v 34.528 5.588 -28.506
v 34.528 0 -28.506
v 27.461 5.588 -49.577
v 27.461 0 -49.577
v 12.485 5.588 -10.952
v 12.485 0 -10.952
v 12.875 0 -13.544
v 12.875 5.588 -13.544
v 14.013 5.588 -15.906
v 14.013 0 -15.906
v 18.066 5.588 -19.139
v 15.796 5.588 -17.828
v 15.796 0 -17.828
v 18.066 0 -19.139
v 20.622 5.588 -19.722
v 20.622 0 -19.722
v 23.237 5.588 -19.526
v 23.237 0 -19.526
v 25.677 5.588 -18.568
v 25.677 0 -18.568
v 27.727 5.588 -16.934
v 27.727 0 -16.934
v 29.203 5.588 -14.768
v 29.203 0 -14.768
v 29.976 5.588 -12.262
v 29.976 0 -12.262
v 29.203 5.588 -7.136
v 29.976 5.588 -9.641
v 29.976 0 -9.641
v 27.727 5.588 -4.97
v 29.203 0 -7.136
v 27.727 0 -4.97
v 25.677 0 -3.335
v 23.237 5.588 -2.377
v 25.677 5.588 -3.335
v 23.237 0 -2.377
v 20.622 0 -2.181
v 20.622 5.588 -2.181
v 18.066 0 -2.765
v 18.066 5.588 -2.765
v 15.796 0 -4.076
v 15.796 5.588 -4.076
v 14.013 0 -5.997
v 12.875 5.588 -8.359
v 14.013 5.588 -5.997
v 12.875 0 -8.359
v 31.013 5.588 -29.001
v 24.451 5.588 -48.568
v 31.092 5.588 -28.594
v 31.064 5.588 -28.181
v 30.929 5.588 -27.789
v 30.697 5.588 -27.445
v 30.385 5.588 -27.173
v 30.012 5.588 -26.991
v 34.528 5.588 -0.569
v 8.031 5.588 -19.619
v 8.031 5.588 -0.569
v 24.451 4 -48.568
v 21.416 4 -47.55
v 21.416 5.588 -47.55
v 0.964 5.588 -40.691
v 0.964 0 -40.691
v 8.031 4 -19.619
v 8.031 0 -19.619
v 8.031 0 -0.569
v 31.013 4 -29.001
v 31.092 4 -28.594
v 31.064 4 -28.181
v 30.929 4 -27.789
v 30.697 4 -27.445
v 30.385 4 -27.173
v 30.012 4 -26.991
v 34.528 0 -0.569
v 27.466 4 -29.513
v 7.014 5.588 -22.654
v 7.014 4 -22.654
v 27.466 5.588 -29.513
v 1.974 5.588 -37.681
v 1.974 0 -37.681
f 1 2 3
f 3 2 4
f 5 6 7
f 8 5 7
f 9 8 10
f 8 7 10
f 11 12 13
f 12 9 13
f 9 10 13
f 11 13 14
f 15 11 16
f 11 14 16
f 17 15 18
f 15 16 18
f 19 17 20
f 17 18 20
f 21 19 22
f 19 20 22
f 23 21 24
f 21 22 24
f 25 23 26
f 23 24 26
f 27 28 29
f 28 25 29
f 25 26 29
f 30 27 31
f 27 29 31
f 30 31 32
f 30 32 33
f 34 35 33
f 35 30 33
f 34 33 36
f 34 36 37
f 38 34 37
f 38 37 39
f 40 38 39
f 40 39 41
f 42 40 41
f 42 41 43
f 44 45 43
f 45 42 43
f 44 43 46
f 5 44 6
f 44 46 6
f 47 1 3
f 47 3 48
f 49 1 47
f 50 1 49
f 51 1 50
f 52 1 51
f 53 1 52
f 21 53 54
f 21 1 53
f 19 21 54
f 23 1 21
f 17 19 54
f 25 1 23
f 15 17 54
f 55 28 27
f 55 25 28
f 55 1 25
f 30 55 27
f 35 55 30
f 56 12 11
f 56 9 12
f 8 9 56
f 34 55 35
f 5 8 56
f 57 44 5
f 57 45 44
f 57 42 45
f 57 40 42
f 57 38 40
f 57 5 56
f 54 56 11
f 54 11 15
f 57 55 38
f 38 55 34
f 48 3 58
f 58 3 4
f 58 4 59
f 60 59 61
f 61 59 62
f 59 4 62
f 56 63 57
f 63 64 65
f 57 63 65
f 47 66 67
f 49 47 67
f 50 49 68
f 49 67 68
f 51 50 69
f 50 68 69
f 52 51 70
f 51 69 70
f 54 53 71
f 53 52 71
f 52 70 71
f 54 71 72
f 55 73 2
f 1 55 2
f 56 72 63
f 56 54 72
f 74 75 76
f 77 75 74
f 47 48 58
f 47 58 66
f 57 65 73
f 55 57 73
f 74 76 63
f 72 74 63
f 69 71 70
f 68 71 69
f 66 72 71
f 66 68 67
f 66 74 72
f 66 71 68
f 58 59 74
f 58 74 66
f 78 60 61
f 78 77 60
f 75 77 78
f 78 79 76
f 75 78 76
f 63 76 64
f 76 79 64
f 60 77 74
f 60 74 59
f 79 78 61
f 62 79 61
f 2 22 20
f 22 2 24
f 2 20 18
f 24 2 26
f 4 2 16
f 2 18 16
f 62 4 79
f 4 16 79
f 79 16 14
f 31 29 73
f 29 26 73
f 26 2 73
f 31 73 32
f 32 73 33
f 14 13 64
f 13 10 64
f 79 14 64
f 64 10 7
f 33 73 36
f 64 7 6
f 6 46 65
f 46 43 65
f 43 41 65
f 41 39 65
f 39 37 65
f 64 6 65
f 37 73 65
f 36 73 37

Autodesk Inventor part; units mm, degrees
ref_plane "YZ Plane" through (0, 0, 0) normal (1, 0, 0) x (0, 1, 0)
ref_plane "XZ Plane" through (0, 0, 0) normal (0, 1, 0) x (-1, 0, 0)
ref_plane "XY Plane" through (0, 0, 0) normal (0, 0, 1) x (1, 0, 0)
sketch "Sketch1" plane through (0, 0, 0) normal (0, 1, 0) x (-1, 0, 0)
  line L0 (-8.0312, -19.6194) -> (-8.0312, -0.5694)
  line L1 (-8.0312, -0.5694) -> (-34.5277, -0.5694)
  line L2 (-34.5277, -0.5694) -> (-34.5277, -28.5056)
  line L3 (18.6455, 5.0782) -> (18.6456, 5.0782)
  line L4 (-1.974, -37.6808) -> (-8.0312, -19.6194)
  line L5 (-34.5277, -28.5056) -> (-27.4611, -49.5771)
  line L6 (-1.974, -37.6808) -> (-0.9645, -40.691)
  line L7 (-27.4611, -49.5771) -> (-0.9645, -40.691)
  circle A0 centre (-21.2795, -10.9517) radius 8.7948
  line L8 (-8.0312, -0.5694) -> (-8.0312, -19.6194)
  line L9 (-8.0312, -19.6194) -> (-0.9645, -40.691)
  line L10 (-0.9645, -40.691) -> (-27.4611, -49.5771)
  line L11 (-27.4611, -49.5771) -> (-34.5277, -28.5056)
  line L12 (-34.5277, -28.5056) -> (-34.5277, -0.5694)
  line L13 (-34.5277, -0.5694) -> (-8.0312, -0.5694)
  point P0 (0, 0)
  point P1 (-21.2795, -2.1569)
  dimension "d4" = 17.5895
  dimension "d0" = 19.05
  dimension "d1" = 22.225
  dimension "d2" = 27.9469
  dimension "d3" = 26.4965
  dimension "d17" = 13.2483
  dimension "d18" = 1.5875
  dimension "d19" = 13.2483
  dimension "d20" = 10.3823
extrude "Extrusion1" add sketch "Sketch1" along normal blind 5.588
sketch "Sketch2" plane through (0, 5.588, 0) normal (0, 1, 0) x (1, 0, 0)
  line L0 (31.5176, 27.4961) -> (8.0312, 19.6194)
  line L1 (8.0312, 19.6194) -> (7.0136, 22.6537)
  line L2 (7.0136, 22.6537) -> (27.4657, 29.5128)
  line L3 (31.5176, 27.4961) -> (29.9884, 26.9832)
  line L4 (27.4657, 29.5128) -> (21.4165, 47.5499)
  line L5 (21.4165, 47.5499) -> (24.4508, 48.5676)
  line L6 (24.4508, 48.5676) -> (31.5176, 27.4961)
  line L7 (27.4611, 49.5771) -> (0.9645, 40.691) projected
  point P0 (0, 0)
  point P1 (0, 0)
  dimension "d10" = 3.175
  dimension "d11" = 3.2004
  dimension "d12" = 3.2004
  dimension "d15" = 0
extrude "Extrusion2" cut sketch "Sketch2" against normal blind 1.5875
fillet "Fillet1" radius 1.5875 1 edges at (31.5176, 4.7942, -27.4961)
properties part number "Lidar Sensor Case Piece 2"
